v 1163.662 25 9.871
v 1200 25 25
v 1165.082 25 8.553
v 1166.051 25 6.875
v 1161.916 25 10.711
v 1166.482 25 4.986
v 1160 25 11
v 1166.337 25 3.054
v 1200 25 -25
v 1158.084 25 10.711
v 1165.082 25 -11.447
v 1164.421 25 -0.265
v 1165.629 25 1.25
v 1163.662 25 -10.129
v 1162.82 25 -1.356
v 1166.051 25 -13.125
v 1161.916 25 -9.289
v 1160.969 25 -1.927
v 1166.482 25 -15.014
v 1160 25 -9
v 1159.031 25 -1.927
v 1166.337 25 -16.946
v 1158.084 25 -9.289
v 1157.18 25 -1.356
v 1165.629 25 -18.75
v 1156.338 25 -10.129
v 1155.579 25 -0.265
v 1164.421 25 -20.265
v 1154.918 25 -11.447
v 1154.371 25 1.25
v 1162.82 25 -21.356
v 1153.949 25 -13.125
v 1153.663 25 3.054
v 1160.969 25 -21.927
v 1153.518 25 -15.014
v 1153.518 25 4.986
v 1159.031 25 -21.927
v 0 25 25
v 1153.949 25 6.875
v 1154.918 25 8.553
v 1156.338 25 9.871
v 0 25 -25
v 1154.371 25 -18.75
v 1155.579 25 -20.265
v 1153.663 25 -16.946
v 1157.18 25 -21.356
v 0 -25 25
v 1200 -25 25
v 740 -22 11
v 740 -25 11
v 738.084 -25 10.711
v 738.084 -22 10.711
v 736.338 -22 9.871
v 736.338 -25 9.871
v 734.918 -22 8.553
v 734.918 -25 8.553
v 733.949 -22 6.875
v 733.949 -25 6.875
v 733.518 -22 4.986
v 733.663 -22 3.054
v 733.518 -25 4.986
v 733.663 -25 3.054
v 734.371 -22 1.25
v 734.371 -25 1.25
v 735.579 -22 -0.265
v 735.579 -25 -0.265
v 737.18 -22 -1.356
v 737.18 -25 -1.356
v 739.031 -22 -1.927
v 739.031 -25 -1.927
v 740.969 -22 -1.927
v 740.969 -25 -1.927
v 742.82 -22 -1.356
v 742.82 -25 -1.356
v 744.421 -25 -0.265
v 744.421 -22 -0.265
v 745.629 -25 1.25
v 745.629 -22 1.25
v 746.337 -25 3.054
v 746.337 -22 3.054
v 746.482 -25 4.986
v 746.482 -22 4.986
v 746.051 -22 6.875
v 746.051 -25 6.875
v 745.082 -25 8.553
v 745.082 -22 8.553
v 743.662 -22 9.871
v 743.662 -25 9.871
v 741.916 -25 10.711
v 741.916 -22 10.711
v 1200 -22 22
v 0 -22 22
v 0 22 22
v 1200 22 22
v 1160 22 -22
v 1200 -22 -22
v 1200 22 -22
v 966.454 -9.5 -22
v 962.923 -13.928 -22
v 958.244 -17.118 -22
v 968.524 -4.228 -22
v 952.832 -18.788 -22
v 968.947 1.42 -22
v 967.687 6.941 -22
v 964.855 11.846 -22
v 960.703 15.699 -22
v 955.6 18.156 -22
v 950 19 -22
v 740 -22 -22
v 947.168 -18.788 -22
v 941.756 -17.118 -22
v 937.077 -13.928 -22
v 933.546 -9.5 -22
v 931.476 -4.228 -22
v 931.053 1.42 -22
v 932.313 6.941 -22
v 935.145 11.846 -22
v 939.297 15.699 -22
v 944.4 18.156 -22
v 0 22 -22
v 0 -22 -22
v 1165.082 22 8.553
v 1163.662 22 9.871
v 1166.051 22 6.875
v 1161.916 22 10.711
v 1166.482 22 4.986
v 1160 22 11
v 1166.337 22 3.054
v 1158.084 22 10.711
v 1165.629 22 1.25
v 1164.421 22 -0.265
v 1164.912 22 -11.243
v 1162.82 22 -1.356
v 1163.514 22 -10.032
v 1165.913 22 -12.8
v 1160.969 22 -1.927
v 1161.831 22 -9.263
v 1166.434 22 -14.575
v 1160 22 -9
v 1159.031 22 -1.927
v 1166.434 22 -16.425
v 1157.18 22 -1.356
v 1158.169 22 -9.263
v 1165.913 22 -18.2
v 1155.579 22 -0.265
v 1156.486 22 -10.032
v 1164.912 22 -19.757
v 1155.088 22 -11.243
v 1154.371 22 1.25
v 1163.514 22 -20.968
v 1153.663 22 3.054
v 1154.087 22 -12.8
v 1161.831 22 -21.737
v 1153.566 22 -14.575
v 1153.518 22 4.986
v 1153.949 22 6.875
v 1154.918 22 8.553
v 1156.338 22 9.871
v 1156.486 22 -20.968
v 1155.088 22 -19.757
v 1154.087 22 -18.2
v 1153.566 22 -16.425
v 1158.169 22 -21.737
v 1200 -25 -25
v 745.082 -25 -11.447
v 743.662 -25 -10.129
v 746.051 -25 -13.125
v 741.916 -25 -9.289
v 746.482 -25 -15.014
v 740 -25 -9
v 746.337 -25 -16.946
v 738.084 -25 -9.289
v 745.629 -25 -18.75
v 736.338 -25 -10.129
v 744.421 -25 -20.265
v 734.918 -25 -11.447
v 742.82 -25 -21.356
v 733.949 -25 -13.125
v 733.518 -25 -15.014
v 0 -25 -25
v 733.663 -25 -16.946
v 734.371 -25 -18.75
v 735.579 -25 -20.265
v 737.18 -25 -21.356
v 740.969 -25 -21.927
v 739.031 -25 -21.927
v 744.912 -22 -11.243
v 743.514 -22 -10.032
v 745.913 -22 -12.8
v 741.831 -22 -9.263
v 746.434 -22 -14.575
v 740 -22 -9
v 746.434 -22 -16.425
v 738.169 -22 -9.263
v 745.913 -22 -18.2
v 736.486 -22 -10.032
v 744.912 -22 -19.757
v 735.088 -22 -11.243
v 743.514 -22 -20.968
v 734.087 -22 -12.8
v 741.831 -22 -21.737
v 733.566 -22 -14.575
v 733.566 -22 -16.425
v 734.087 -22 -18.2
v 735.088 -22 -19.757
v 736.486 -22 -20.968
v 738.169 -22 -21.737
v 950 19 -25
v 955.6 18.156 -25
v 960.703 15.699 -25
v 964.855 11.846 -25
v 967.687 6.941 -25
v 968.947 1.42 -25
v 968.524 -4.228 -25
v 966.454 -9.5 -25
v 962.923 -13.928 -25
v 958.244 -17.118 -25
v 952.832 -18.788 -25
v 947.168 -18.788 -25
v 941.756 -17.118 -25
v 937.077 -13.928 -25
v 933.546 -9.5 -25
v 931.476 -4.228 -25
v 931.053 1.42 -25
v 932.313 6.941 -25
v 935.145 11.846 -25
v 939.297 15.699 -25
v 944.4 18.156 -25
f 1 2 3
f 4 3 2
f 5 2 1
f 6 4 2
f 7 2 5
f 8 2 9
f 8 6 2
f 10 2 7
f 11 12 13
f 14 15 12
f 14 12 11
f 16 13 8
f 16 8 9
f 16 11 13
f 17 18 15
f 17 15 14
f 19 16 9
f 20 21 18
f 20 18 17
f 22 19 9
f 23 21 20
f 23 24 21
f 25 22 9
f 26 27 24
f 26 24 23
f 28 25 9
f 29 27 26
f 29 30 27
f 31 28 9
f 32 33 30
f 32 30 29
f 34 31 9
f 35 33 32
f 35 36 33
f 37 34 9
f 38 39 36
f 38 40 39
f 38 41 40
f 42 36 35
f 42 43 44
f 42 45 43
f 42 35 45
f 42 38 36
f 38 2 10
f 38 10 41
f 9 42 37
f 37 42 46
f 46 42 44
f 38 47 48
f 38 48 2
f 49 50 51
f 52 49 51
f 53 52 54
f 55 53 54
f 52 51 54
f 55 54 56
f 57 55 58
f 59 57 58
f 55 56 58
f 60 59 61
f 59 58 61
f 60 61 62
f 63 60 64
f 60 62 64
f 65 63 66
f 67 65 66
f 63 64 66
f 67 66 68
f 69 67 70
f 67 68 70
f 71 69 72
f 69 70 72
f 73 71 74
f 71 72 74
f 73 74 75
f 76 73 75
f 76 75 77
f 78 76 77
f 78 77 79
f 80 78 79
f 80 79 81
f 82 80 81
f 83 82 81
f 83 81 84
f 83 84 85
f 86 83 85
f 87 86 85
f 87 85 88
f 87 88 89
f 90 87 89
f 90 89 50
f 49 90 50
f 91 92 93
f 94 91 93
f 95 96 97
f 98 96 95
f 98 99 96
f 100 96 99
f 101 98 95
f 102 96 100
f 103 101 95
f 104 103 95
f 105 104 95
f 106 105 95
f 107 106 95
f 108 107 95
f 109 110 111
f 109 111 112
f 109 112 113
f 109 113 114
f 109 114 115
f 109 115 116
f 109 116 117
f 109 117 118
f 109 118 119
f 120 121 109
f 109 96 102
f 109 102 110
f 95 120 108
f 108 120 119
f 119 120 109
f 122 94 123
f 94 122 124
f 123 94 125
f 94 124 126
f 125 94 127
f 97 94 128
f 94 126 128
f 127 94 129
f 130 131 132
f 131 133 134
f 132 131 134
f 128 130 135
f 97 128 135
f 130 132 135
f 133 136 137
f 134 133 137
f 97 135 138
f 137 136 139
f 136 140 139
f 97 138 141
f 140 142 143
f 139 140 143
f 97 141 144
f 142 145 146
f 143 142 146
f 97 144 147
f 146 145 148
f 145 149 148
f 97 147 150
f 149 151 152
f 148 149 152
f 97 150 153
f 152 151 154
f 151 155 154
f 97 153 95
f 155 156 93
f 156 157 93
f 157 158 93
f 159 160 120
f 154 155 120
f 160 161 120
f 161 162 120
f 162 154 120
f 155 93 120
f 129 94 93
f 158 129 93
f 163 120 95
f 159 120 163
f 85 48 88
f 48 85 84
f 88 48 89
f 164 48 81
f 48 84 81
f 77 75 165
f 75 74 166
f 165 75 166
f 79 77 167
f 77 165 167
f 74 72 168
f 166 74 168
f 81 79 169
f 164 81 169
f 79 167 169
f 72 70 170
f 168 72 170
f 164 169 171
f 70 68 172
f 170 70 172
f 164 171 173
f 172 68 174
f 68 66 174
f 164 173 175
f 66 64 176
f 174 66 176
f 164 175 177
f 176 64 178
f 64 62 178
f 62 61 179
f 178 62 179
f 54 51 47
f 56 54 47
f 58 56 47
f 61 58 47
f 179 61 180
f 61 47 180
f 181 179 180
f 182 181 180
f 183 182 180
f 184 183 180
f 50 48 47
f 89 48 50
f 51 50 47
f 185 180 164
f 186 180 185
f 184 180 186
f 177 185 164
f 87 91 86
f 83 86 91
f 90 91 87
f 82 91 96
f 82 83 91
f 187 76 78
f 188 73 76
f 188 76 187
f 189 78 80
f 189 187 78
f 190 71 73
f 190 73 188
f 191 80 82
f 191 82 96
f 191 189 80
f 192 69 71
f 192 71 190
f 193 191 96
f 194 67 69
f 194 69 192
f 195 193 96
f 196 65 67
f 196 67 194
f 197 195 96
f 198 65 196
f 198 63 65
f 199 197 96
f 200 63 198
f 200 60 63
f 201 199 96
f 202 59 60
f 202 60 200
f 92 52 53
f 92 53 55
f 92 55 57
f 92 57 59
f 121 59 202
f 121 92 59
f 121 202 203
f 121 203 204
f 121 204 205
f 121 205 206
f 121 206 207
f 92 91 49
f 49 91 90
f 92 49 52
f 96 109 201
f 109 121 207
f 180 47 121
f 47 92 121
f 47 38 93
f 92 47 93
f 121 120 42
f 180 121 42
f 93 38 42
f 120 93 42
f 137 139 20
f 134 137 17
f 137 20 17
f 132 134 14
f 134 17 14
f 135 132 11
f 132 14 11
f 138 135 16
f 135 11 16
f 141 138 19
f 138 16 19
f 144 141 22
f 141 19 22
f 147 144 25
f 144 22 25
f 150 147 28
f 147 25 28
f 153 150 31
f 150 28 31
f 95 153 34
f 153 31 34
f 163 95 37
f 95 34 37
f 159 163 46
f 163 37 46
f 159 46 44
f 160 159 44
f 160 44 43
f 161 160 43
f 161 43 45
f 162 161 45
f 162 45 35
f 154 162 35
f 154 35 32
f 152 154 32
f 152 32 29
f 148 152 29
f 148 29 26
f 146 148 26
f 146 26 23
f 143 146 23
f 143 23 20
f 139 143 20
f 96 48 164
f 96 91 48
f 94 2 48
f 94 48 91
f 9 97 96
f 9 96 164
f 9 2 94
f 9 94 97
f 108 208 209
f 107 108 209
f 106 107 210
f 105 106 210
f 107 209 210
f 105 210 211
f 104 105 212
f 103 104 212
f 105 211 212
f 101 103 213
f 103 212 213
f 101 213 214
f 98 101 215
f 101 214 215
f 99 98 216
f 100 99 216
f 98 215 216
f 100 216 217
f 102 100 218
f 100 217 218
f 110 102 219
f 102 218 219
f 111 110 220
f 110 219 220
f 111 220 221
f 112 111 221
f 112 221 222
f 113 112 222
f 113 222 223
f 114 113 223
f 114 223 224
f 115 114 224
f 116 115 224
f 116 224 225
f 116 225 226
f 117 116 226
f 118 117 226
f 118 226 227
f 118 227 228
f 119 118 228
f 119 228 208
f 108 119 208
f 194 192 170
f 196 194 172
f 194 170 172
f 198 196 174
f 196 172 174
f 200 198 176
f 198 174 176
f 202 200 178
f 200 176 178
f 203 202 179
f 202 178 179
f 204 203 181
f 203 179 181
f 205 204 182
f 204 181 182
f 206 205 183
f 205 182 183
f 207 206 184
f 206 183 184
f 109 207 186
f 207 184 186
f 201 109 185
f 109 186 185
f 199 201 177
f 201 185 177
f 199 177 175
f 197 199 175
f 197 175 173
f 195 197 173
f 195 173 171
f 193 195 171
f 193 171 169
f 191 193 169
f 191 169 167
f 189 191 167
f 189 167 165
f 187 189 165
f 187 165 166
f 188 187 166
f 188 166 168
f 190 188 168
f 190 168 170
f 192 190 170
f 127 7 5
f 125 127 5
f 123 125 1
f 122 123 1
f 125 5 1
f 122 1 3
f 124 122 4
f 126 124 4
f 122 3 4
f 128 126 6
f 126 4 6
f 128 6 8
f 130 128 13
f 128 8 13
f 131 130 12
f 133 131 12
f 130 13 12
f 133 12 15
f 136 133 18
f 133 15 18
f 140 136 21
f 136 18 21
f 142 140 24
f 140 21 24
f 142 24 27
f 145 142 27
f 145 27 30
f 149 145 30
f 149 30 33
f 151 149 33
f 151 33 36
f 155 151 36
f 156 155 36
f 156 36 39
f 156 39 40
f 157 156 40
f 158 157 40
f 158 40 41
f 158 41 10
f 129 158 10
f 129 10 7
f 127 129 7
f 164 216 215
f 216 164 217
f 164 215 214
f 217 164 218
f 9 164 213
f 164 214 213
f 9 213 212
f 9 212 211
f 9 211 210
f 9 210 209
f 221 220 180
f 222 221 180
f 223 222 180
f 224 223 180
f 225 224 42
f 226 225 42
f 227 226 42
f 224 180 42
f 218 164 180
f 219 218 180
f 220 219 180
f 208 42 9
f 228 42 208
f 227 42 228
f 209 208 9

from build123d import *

# Parameters (mm, degrees)
SKETCH1_W           = 50
SKETCH1_H           = 50
SKETCH1_W_2         = 44
SKETCH1_H_2         = 44
BOSS_EXTRUDE1_DEPTH = 1200
CUT_EXTRUDE1_REACH  = 1203.301
SKETCH2_R           = 19
CUT_EXTRUDE2_REACH  = 1203.301
SKETCH3_R           = 6.5
CIRPATTERN1_COUNT   = 2


with BuildPart() as part:
    # Sketch1 → Boss-Extrude1 (new body)
    with BuildSketch(Plane(origin=(0, 0, 0), x_dir=(0, 0, -1), z_dir=(1, 0, 0))):
        Rectangle(SKETCH1_W, SKETCH1_H)
        Rectangle(SKETCH1_W_2, SKETCH1_H_2, mode=Mode.SUBTRACT)
    extrude(amount=BOSS_EXTRUDE1_DEPTH)

    # Sketch2 → Cut-Extrude1 (cut, up to next)
    with BuildSketch(Plane(origin=(0, 0, -25), x_dir=(-1, 0, 0), z_dir=(0, 0, -1)), mode=Mode.PRIVATE) as cut_extrude1_sk1:
        with Locations(Location((-950, 0, 0), (0, 0, 90))):
            Circle(SKETCH2_R)
    cut_extrude1_tool1 = extrude(cut_extrude1_sk1.sketch, amount=-CUT_EXTRUDE1_REACH, mode=Mode.PRIVATE) & part.part
    add(cut_extrude1_tool1.solids().sort_by_distance((950, 0, -25))[0], mode=Mode.SUBTRACT)

    # Sketch3 → Cut-Extrude2 (cut, up to next)
    with BuildSketch(Plane(origin=(0, 25, 0), x_dir=(1, 0, 0), z_dir=(0, 1, 0)), mode=Mode.PRIVATE) as cut_extrude2_sk1:
        with Locations(Location((1160, -4.5, 0), (0, 0, 270))):
            Circle(SKETCH3_R)
    cut_extrude2_tool1 = extrude(cut_extrude2_sk1.sketch, amount=-CUT_EXTRUDE2_REACH, mode=Mode.PRIVATE) & part.part
    # Sketch3 → Cut-Extrude2 (cut, up to next)
    with BuildSketch(Plane(origin=(0, 25, 0), x_dir=(1, 0, 0), z_dir=(0, 1, 0)), mode=Mode.PRIVATE) as cut_extrude2_sk2:
        with Locations(Location((1160, 15.5, 0), (0, 0, 270))):
            Circle(SKETCH3_R)
    cut_extrude2_tool2 = extrude(cut_extrude2_sk2.sketch, amount=-CUT_EXTRUDE2_REACH, mode=Mode.PRIVATE) & part.part
    cut_extrude2_1 = cut_extrude2_tool1.solids().sort_by_distance((1160, 25, 4.5))[0]
    add(cut_extrude2_1, mode=Mode.SUBTRACT)
    cut_extrude2_2 = cut_extrude2_tool2.solids().sort_by_distance((1160, 25, -15.5))[0]
    add(cut_extrude2_2, mode=Mode.SUBTRACT)
    cut_extrude2 = cut_extrude2_1 + cut_extrude2_2  # Cut-Extrude2 as one shape, for the pattern or mirror that repeats it

    # CirPattern1: Cut-Extrude2 ×2 about axis
    cirpattern1_axis = Axis((950, 0, 25.001), (0, 0, -1))
    for i in range(1, CIRPATTERN1_COUNT):
        add(cut_extrude2.rotate(cirpattern1_axis, i * 360 / CIRPATTERN1_COUNT), mode=Mode.SUBTRACT)


solid = part.part
